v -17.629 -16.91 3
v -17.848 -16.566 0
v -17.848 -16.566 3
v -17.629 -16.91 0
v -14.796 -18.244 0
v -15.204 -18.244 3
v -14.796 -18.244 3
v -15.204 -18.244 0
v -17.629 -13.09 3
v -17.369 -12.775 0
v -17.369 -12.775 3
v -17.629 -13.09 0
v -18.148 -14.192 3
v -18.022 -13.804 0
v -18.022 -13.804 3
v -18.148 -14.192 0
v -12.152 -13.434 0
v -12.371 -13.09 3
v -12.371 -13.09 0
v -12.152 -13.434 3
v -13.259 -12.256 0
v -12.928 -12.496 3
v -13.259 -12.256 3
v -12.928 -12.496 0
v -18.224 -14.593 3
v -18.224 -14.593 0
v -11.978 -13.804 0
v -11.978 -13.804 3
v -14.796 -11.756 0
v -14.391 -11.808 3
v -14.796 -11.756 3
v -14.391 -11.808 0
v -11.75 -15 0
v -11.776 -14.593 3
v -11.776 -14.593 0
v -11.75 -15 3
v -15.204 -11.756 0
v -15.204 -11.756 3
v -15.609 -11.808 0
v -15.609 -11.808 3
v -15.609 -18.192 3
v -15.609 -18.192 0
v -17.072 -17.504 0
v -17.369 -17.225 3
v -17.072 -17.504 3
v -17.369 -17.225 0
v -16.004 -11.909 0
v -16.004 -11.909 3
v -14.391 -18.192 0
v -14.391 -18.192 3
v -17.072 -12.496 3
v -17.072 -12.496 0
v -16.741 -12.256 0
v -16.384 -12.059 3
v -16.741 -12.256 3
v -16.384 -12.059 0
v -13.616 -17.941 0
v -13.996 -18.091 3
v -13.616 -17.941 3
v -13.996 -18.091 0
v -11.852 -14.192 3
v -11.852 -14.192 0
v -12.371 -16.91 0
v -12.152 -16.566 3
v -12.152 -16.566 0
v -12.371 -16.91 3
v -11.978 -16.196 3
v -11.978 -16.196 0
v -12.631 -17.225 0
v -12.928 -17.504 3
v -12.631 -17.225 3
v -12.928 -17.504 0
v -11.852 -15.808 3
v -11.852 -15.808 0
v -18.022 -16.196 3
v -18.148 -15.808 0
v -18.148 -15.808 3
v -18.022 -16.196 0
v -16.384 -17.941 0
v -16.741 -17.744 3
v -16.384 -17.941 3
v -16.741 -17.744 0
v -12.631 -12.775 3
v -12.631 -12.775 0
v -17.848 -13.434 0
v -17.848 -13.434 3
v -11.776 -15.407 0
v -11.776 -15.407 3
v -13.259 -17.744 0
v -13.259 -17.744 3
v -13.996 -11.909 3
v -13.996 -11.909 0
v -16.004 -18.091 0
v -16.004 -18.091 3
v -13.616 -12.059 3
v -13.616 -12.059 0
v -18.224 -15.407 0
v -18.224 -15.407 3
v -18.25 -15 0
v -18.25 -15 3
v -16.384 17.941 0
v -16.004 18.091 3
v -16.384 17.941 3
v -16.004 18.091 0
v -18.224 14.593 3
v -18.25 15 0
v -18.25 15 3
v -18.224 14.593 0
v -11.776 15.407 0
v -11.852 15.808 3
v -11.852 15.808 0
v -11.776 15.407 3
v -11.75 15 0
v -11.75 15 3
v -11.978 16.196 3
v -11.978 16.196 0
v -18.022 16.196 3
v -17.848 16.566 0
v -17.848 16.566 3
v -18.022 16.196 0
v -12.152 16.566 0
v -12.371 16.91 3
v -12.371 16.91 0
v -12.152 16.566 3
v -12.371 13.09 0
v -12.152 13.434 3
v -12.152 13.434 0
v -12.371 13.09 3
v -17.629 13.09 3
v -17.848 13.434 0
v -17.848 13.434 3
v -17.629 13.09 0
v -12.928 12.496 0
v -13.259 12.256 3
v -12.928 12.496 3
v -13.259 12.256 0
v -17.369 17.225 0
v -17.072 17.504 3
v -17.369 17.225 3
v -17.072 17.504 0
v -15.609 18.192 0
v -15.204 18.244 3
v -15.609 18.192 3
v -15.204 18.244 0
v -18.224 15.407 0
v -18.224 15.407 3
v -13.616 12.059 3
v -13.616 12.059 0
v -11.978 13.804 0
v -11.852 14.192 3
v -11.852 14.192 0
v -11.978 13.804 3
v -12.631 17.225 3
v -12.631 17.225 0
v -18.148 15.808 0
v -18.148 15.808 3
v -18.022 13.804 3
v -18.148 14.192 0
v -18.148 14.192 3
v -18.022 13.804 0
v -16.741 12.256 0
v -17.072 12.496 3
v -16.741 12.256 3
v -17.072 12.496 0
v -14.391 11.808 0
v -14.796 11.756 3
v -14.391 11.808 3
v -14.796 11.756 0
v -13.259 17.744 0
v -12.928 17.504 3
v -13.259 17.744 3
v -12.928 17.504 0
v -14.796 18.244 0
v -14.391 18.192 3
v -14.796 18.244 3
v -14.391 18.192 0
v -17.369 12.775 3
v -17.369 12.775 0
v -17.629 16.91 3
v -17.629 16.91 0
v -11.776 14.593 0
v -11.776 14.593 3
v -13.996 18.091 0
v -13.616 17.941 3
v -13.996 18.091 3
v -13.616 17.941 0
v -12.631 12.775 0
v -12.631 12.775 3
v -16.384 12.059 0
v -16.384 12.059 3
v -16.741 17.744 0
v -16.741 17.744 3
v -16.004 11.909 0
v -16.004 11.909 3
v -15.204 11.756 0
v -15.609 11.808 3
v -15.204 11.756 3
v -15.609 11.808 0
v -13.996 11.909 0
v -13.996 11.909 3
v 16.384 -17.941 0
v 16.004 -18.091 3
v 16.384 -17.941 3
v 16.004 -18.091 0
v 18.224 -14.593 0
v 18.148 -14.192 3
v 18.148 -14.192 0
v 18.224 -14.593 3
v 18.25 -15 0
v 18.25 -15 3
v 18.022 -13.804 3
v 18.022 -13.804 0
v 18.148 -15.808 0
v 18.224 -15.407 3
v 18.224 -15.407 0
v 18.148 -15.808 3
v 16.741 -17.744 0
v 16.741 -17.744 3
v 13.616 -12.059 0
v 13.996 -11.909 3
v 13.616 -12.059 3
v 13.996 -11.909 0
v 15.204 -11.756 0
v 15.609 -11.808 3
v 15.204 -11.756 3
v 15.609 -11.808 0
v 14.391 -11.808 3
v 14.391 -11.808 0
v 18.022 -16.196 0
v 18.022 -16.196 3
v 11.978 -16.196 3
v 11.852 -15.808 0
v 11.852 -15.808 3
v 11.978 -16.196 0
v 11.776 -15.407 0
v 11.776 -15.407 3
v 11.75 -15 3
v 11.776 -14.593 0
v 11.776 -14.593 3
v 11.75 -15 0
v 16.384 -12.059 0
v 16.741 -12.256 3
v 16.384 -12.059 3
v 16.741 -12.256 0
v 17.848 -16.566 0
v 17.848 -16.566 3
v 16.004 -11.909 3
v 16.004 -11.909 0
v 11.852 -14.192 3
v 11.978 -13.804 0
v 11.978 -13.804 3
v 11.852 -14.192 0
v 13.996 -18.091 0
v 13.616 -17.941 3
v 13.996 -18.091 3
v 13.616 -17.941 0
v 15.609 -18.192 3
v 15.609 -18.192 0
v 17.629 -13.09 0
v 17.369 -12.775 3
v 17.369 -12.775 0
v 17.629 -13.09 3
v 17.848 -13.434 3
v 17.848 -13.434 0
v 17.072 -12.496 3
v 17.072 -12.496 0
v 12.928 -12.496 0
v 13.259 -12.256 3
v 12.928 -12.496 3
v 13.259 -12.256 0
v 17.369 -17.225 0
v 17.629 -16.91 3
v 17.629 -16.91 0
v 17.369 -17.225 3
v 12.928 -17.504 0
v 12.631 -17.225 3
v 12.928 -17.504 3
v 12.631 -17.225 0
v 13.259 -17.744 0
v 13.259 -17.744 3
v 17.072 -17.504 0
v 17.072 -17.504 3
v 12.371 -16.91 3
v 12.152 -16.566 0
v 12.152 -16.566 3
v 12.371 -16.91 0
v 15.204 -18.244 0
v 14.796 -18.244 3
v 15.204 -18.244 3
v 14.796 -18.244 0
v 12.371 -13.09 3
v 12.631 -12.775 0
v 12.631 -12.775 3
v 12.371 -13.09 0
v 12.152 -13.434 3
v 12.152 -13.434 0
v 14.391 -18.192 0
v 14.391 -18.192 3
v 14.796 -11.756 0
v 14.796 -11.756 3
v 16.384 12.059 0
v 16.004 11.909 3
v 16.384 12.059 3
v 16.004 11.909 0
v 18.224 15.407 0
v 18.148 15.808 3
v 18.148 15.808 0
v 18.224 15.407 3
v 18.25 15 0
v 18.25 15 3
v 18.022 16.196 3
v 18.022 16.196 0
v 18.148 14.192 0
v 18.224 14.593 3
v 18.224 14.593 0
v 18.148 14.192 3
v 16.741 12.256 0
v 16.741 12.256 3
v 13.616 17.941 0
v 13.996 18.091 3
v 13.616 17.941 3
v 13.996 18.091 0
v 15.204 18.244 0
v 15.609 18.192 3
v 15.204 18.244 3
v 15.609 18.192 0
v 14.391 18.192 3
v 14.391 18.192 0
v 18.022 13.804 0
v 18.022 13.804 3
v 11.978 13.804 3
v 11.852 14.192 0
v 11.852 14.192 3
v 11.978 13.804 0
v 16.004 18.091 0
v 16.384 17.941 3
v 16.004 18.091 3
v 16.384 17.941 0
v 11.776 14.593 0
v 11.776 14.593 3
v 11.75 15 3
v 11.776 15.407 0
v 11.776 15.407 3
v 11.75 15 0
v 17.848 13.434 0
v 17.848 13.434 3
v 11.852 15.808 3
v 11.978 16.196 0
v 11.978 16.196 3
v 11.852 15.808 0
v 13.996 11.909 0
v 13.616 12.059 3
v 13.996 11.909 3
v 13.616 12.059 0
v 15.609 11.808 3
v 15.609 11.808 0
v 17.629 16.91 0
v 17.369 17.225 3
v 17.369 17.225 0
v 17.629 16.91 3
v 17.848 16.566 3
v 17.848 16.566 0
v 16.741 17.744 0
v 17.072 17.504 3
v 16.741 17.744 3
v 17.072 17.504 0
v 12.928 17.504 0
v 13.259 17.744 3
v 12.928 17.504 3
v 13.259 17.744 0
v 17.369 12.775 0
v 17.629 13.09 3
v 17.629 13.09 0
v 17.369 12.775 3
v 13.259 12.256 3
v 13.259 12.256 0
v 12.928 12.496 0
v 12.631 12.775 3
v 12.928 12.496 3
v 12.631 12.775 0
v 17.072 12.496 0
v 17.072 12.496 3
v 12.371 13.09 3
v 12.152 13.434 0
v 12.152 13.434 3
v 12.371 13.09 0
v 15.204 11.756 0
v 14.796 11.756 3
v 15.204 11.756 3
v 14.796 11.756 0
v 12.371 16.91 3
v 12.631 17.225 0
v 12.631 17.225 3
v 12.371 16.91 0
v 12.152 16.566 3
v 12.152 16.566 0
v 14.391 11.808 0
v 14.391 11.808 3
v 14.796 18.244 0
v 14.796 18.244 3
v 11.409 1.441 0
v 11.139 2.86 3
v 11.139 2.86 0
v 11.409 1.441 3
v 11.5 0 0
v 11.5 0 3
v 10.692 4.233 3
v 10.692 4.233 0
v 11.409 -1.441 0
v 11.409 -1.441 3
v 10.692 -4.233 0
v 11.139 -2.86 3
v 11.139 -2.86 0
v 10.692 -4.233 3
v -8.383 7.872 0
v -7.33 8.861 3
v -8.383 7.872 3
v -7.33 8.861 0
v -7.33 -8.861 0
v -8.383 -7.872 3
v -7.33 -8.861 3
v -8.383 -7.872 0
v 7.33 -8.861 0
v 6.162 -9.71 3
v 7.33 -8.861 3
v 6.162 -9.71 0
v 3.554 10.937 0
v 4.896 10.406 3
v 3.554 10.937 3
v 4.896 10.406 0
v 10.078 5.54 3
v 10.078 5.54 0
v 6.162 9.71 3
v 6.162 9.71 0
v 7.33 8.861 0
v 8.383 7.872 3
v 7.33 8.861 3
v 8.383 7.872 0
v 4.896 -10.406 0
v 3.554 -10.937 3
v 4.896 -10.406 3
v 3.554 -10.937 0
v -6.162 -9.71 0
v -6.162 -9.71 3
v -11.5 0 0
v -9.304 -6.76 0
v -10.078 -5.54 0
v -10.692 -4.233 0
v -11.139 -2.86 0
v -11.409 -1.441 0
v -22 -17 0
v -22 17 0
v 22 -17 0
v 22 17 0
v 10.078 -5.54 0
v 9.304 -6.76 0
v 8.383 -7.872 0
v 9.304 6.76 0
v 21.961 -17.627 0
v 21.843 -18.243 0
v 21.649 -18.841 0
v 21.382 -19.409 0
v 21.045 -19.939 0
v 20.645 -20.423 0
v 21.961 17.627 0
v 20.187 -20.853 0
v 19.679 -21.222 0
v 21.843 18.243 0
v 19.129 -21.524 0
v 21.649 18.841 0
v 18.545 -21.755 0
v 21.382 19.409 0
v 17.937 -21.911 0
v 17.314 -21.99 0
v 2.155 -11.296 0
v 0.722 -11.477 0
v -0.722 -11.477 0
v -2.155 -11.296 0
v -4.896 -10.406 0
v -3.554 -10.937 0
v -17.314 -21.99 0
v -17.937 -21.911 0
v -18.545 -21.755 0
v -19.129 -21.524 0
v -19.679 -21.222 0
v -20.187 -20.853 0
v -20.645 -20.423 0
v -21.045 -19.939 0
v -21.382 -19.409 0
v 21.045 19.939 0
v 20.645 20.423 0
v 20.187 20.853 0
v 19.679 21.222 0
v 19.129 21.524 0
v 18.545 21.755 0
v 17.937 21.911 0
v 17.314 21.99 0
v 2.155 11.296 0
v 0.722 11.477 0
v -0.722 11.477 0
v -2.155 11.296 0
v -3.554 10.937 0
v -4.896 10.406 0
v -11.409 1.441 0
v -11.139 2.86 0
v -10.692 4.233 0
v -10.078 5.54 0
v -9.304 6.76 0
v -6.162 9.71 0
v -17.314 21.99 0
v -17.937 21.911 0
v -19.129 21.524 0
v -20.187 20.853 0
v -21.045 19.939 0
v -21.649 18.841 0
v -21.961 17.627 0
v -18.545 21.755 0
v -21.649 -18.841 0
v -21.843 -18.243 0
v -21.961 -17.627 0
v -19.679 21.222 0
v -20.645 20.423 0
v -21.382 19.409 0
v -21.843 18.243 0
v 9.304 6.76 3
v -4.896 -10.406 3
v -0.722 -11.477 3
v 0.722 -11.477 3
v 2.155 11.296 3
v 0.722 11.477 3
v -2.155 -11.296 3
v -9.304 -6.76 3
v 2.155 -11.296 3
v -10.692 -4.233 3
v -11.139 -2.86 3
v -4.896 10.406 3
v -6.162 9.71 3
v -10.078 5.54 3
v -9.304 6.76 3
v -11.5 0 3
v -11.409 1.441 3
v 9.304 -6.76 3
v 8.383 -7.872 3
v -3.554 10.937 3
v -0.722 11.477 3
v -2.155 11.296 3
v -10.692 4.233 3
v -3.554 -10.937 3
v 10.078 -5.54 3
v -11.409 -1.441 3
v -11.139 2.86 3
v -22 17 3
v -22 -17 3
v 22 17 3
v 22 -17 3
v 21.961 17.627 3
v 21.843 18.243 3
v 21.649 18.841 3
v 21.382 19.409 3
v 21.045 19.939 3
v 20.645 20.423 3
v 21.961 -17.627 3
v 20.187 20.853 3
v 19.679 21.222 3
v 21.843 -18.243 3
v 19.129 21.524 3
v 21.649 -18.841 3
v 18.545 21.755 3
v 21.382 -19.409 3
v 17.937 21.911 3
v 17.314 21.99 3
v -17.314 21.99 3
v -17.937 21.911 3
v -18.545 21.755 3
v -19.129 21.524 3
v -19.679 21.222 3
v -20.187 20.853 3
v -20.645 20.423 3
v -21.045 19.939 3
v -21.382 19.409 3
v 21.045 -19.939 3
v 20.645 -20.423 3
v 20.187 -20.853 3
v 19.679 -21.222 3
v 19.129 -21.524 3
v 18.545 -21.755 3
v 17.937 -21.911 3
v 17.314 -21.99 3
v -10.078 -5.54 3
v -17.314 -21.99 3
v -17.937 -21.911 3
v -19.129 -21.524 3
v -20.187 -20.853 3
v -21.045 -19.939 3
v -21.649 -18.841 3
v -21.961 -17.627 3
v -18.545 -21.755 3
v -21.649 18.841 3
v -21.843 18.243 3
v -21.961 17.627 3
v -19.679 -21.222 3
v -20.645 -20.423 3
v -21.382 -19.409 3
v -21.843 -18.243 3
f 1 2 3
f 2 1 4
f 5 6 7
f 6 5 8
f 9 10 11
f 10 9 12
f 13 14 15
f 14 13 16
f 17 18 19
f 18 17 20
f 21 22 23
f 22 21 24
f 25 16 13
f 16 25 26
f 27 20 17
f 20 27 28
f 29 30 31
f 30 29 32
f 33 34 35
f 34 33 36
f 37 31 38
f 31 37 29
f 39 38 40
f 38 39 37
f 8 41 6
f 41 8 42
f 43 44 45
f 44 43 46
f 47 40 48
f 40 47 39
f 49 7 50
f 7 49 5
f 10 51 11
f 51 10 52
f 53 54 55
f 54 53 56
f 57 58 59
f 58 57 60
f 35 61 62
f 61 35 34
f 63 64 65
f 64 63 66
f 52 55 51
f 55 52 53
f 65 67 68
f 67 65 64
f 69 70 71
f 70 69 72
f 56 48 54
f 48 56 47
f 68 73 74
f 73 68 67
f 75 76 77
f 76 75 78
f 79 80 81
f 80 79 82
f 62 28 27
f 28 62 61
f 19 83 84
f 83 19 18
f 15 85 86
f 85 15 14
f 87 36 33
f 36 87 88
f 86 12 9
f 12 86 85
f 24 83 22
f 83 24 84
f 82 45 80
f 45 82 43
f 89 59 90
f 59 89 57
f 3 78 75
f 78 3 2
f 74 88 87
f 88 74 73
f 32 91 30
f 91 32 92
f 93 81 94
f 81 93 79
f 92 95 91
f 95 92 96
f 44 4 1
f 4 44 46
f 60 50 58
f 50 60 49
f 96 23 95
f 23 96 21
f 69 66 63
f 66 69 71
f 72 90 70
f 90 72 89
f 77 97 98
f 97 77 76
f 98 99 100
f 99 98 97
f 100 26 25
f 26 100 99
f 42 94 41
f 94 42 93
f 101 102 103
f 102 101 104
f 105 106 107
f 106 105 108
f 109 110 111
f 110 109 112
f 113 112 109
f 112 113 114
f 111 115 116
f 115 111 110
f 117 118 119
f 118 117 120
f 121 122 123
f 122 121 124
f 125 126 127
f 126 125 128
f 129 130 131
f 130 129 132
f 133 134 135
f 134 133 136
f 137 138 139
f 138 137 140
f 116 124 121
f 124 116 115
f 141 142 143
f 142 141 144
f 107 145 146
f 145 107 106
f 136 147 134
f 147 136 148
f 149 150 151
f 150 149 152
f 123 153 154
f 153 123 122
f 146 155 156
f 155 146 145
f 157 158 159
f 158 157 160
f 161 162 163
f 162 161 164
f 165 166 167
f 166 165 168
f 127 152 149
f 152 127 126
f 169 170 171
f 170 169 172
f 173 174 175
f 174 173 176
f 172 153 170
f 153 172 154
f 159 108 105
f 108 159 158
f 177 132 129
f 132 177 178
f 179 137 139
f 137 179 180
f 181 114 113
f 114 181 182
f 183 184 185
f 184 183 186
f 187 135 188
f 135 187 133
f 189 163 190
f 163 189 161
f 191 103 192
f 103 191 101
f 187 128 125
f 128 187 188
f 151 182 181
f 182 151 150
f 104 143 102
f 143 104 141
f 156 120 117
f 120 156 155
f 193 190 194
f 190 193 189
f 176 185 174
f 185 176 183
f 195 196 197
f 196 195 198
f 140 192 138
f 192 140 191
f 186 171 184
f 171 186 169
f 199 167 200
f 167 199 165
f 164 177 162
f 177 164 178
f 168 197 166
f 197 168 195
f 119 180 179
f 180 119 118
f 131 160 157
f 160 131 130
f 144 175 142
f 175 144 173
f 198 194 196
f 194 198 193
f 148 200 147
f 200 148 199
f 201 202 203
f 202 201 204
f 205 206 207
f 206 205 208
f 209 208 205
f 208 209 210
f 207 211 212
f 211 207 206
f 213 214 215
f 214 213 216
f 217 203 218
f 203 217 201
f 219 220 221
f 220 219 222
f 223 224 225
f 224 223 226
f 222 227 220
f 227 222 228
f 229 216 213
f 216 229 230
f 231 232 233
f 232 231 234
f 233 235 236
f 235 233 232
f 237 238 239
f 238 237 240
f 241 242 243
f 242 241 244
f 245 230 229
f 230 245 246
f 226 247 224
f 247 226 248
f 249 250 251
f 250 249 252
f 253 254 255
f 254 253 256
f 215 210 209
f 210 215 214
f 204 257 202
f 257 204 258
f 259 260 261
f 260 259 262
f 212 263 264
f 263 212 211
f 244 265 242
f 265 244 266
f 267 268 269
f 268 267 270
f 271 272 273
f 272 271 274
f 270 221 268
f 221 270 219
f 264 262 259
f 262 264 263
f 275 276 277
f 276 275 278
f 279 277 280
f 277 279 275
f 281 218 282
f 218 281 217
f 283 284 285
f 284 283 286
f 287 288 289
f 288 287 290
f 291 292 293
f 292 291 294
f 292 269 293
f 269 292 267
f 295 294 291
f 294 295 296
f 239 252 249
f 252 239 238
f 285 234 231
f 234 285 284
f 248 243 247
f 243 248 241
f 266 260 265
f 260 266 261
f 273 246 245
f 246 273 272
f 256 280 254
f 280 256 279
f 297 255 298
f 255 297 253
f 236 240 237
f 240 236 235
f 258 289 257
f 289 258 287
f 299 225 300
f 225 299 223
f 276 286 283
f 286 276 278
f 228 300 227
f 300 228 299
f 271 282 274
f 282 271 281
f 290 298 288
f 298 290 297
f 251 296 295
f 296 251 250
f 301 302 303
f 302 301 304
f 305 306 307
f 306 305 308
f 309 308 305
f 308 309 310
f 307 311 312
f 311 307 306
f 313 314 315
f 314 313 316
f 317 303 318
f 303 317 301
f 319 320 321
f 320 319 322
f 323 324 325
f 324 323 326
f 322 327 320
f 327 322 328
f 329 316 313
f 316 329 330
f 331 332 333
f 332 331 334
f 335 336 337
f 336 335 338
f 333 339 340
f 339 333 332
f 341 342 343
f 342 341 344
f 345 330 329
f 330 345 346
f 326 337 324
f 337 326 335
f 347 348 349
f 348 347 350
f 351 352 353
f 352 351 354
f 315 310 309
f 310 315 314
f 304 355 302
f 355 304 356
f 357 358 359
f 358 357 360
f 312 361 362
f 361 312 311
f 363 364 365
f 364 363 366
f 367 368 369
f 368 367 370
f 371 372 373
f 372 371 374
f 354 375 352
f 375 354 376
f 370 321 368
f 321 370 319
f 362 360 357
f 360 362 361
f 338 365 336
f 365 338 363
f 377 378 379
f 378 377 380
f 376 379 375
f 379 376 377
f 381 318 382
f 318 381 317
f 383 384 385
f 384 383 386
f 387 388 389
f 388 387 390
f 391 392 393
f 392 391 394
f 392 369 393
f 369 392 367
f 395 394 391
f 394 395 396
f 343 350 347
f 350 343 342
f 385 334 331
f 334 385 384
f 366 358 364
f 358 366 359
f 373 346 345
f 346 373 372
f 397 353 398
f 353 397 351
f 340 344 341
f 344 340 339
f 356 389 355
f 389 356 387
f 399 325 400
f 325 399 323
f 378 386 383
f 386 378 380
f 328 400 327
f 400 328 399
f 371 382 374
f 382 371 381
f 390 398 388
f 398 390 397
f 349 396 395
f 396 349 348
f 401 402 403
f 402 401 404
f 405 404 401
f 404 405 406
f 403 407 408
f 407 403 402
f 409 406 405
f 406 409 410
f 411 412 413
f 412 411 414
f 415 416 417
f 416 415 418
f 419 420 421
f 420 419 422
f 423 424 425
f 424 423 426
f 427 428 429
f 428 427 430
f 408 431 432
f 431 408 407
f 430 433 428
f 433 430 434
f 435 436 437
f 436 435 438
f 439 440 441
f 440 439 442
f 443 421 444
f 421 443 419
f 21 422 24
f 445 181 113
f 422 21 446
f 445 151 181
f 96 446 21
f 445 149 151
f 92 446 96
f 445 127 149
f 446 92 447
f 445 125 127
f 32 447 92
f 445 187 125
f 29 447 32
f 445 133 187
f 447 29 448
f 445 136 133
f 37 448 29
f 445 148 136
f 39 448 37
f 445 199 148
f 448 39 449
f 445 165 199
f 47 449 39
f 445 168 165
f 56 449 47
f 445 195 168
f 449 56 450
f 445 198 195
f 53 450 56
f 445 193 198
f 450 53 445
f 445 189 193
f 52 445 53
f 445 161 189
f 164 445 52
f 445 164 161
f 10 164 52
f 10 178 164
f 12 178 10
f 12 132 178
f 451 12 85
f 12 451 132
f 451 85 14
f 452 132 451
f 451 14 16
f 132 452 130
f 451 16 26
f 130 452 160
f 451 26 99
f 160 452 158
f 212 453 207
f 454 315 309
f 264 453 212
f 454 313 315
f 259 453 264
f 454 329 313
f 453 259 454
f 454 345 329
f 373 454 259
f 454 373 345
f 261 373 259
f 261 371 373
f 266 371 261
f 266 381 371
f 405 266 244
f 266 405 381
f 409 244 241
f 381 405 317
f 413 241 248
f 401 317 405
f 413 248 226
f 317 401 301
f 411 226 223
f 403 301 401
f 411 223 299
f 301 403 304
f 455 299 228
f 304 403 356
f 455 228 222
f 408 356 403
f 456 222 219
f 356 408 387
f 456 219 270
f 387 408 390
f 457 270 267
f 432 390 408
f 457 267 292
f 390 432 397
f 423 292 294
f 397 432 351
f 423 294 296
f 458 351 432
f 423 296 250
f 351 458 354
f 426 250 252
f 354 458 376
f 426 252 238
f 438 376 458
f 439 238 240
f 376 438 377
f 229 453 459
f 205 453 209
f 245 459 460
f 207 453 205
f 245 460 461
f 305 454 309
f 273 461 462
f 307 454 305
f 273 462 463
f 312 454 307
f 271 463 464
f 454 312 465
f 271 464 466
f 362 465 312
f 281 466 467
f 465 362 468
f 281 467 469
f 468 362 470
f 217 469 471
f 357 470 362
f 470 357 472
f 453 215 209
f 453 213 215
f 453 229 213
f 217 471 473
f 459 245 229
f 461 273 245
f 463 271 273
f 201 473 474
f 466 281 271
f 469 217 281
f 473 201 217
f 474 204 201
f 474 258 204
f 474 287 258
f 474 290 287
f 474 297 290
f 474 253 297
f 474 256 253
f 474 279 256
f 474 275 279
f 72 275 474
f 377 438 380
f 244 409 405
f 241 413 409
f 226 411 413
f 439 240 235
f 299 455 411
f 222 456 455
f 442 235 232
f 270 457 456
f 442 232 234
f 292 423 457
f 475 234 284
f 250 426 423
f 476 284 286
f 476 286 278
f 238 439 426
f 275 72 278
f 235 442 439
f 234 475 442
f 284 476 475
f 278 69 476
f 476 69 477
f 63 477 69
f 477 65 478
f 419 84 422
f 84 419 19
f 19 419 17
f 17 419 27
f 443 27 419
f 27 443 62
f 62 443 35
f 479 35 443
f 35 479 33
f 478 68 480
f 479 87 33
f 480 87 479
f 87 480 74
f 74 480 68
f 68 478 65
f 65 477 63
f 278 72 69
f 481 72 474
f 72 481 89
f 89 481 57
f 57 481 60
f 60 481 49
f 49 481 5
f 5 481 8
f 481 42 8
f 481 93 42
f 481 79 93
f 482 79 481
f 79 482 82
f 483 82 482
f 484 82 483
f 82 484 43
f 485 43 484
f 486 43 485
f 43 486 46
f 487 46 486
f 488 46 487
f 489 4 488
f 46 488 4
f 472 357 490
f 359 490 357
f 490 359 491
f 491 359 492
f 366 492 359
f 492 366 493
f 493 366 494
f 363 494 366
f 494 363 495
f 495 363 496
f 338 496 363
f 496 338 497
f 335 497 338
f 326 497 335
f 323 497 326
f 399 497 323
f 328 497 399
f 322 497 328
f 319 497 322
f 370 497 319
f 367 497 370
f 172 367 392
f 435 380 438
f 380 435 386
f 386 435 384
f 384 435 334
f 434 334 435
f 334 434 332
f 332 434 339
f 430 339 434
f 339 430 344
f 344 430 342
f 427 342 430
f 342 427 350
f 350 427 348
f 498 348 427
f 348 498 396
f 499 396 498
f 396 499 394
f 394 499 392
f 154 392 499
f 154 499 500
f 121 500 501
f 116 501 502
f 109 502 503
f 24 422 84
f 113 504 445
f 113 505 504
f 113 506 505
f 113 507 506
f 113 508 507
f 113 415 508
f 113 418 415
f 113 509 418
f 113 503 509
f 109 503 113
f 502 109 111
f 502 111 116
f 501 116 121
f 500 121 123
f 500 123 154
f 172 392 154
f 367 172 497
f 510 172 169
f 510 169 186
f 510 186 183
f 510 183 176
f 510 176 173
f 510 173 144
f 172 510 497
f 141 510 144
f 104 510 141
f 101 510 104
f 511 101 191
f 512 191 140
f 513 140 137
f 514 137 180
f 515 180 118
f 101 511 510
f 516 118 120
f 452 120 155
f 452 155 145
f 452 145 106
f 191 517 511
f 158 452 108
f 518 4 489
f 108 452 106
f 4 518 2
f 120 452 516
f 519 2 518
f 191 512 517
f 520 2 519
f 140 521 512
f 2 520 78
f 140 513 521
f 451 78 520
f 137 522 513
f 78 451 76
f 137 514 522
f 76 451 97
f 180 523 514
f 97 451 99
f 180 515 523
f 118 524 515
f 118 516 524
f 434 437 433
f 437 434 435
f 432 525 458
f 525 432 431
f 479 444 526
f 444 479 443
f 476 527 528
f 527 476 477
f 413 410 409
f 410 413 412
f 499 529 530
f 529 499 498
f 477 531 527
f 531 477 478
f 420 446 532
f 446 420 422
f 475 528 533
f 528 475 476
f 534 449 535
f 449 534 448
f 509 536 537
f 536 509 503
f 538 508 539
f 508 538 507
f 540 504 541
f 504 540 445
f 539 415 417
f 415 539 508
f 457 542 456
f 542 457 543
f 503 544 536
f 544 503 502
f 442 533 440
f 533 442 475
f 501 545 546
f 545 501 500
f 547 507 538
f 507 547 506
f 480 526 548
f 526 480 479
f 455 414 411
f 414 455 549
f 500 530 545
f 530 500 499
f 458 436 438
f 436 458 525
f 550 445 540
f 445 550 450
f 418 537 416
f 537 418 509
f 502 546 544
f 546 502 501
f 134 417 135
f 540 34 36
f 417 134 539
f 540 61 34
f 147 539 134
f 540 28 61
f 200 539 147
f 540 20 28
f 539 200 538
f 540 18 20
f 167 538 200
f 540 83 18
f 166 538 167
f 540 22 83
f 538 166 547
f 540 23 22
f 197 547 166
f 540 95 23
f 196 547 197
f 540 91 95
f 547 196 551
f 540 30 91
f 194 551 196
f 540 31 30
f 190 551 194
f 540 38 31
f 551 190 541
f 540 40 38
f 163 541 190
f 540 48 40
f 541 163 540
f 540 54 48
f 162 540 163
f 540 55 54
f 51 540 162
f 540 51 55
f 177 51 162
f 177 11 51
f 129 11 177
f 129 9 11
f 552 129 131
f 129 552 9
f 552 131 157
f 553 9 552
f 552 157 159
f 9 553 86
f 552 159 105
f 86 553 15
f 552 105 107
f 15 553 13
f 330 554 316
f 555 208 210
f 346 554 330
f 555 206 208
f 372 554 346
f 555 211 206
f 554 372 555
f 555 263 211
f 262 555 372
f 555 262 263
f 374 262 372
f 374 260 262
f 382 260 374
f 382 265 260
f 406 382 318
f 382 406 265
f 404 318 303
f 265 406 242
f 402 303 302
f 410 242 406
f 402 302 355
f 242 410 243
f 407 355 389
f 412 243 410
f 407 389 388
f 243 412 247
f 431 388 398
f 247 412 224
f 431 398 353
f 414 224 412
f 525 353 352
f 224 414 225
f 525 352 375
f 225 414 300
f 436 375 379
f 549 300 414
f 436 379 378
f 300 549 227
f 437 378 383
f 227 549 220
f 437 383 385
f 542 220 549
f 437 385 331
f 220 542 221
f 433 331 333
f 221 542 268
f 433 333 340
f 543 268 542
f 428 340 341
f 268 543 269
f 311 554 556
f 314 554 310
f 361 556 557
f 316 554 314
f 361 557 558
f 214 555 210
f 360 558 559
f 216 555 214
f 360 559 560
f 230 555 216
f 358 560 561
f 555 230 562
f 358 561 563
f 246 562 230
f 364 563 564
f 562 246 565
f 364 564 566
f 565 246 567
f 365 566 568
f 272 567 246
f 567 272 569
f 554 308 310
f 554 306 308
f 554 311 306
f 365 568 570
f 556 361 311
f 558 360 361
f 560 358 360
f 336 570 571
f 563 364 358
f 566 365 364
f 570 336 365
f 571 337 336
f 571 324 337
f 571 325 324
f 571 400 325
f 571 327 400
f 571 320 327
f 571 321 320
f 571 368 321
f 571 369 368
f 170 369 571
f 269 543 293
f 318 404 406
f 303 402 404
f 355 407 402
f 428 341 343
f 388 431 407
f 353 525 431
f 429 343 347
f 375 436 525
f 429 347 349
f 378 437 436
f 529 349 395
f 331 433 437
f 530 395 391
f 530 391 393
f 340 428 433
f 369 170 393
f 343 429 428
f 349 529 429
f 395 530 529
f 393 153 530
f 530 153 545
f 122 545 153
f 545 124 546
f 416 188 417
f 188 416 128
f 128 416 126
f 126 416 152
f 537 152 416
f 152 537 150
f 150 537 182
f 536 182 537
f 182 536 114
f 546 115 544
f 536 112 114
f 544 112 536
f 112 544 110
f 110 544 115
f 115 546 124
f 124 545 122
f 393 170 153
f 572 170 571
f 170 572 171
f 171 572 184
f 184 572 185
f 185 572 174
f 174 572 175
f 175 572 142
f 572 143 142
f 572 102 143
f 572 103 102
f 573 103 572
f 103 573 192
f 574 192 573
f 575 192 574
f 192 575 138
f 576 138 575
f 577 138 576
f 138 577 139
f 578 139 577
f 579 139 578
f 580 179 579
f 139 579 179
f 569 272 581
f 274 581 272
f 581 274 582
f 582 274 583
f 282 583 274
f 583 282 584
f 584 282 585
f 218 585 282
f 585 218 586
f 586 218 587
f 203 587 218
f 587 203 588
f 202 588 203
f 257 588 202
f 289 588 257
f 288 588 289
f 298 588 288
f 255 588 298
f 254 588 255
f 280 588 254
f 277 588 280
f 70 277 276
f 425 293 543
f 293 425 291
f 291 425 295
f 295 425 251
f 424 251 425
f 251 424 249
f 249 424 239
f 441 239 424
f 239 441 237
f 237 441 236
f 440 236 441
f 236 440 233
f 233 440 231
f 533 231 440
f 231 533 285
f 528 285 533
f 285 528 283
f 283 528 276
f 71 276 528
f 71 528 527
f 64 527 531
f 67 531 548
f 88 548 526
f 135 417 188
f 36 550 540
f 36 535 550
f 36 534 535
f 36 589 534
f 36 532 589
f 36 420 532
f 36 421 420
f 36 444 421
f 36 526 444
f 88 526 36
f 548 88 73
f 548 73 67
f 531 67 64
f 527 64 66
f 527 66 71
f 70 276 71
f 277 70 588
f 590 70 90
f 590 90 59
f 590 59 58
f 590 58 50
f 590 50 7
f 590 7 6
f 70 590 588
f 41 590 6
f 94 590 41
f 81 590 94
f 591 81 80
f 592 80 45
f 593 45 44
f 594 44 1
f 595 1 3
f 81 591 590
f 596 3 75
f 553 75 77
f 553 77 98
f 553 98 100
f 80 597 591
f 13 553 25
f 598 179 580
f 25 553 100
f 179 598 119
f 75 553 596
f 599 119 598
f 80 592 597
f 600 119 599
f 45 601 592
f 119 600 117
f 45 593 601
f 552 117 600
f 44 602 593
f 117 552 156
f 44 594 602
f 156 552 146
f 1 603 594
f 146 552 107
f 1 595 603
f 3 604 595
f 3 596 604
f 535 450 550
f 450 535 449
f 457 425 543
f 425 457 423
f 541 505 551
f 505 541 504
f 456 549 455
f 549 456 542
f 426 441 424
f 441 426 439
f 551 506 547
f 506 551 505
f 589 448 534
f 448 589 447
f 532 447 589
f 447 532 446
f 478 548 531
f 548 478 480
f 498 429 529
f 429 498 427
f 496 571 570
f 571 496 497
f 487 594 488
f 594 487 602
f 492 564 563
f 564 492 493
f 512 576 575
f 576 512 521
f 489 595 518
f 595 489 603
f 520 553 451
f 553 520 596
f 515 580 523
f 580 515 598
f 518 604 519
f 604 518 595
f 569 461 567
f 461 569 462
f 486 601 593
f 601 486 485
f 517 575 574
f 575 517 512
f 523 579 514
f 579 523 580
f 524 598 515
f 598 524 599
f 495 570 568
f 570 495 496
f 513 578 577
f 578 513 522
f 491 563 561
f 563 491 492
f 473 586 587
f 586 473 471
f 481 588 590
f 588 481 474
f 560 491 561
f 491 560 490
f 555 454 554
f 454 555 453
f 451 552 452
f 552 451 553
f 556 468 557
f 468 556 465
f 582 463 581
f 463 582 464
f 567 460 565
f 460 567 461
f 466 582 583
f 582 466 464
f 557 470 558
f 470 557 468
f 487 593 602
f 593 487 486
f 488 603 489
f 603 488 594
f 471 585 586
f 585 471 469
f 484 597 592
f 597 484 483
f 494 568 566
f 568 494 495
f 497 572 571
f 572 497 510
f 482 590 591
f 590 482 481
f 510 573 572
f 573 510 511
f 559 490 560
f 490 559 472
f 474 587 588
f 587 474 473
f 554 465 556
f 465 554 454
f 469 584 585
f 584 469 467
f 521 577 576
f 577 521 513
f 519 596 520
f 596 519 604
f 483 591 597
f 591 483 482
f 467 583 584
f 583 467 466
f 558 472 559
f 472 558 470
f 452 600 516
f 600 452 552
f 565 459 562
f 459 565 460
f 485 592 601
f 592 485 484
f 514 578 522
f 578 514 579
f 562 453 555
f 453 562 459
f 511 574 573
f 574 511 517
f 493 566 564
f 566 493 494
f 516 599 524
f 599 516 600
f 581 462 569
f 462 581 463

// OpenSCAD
$fn = 50;


difference() {
	union() {
		hull() {
			translate(v = [-17.0000000000, 17.0000000000, 0]) {
				cylinder(h = 3, r = 5);
			}
			translate(v = [17.0000000000, 17.0000000000, 0]) {
				cylinder(h = 3, r = 5);
			}
			translate(v = [-17.0000000000, -17.0000000000, 0]) {
				cylinder(h = 3, r = 5);
			}
			translate(v = [17.0000000000, -17.0000000000, 0]) {
				cylinder(h = 3, r = 5);
			}
		}
	}
	union() {
		#translate(v = [-15.0000000000, -15.0000000000, -100.0000000000]) {
			cylinder(h = 200, r = 3.2500000000);
		}
		#translate(v = [-15.0000000000, 15.0000000000, -100.0000000000]) {
			cylinder(h = 200, r = 3.2500000000);
		}
		#translate(v = [15.0000000000, -15.0000000000, -100.0000000000]) {
			cylinder(h = 200, r = 3.2500000000);
		}
		#translate(v = [15.0000000000, 15.0000000000, -100.0000000000]) {
			cylinder(h = 200, r = 3.2500000000);
		}
		#cylinder(h = 3, r = 11.5000000000);
	}
}
